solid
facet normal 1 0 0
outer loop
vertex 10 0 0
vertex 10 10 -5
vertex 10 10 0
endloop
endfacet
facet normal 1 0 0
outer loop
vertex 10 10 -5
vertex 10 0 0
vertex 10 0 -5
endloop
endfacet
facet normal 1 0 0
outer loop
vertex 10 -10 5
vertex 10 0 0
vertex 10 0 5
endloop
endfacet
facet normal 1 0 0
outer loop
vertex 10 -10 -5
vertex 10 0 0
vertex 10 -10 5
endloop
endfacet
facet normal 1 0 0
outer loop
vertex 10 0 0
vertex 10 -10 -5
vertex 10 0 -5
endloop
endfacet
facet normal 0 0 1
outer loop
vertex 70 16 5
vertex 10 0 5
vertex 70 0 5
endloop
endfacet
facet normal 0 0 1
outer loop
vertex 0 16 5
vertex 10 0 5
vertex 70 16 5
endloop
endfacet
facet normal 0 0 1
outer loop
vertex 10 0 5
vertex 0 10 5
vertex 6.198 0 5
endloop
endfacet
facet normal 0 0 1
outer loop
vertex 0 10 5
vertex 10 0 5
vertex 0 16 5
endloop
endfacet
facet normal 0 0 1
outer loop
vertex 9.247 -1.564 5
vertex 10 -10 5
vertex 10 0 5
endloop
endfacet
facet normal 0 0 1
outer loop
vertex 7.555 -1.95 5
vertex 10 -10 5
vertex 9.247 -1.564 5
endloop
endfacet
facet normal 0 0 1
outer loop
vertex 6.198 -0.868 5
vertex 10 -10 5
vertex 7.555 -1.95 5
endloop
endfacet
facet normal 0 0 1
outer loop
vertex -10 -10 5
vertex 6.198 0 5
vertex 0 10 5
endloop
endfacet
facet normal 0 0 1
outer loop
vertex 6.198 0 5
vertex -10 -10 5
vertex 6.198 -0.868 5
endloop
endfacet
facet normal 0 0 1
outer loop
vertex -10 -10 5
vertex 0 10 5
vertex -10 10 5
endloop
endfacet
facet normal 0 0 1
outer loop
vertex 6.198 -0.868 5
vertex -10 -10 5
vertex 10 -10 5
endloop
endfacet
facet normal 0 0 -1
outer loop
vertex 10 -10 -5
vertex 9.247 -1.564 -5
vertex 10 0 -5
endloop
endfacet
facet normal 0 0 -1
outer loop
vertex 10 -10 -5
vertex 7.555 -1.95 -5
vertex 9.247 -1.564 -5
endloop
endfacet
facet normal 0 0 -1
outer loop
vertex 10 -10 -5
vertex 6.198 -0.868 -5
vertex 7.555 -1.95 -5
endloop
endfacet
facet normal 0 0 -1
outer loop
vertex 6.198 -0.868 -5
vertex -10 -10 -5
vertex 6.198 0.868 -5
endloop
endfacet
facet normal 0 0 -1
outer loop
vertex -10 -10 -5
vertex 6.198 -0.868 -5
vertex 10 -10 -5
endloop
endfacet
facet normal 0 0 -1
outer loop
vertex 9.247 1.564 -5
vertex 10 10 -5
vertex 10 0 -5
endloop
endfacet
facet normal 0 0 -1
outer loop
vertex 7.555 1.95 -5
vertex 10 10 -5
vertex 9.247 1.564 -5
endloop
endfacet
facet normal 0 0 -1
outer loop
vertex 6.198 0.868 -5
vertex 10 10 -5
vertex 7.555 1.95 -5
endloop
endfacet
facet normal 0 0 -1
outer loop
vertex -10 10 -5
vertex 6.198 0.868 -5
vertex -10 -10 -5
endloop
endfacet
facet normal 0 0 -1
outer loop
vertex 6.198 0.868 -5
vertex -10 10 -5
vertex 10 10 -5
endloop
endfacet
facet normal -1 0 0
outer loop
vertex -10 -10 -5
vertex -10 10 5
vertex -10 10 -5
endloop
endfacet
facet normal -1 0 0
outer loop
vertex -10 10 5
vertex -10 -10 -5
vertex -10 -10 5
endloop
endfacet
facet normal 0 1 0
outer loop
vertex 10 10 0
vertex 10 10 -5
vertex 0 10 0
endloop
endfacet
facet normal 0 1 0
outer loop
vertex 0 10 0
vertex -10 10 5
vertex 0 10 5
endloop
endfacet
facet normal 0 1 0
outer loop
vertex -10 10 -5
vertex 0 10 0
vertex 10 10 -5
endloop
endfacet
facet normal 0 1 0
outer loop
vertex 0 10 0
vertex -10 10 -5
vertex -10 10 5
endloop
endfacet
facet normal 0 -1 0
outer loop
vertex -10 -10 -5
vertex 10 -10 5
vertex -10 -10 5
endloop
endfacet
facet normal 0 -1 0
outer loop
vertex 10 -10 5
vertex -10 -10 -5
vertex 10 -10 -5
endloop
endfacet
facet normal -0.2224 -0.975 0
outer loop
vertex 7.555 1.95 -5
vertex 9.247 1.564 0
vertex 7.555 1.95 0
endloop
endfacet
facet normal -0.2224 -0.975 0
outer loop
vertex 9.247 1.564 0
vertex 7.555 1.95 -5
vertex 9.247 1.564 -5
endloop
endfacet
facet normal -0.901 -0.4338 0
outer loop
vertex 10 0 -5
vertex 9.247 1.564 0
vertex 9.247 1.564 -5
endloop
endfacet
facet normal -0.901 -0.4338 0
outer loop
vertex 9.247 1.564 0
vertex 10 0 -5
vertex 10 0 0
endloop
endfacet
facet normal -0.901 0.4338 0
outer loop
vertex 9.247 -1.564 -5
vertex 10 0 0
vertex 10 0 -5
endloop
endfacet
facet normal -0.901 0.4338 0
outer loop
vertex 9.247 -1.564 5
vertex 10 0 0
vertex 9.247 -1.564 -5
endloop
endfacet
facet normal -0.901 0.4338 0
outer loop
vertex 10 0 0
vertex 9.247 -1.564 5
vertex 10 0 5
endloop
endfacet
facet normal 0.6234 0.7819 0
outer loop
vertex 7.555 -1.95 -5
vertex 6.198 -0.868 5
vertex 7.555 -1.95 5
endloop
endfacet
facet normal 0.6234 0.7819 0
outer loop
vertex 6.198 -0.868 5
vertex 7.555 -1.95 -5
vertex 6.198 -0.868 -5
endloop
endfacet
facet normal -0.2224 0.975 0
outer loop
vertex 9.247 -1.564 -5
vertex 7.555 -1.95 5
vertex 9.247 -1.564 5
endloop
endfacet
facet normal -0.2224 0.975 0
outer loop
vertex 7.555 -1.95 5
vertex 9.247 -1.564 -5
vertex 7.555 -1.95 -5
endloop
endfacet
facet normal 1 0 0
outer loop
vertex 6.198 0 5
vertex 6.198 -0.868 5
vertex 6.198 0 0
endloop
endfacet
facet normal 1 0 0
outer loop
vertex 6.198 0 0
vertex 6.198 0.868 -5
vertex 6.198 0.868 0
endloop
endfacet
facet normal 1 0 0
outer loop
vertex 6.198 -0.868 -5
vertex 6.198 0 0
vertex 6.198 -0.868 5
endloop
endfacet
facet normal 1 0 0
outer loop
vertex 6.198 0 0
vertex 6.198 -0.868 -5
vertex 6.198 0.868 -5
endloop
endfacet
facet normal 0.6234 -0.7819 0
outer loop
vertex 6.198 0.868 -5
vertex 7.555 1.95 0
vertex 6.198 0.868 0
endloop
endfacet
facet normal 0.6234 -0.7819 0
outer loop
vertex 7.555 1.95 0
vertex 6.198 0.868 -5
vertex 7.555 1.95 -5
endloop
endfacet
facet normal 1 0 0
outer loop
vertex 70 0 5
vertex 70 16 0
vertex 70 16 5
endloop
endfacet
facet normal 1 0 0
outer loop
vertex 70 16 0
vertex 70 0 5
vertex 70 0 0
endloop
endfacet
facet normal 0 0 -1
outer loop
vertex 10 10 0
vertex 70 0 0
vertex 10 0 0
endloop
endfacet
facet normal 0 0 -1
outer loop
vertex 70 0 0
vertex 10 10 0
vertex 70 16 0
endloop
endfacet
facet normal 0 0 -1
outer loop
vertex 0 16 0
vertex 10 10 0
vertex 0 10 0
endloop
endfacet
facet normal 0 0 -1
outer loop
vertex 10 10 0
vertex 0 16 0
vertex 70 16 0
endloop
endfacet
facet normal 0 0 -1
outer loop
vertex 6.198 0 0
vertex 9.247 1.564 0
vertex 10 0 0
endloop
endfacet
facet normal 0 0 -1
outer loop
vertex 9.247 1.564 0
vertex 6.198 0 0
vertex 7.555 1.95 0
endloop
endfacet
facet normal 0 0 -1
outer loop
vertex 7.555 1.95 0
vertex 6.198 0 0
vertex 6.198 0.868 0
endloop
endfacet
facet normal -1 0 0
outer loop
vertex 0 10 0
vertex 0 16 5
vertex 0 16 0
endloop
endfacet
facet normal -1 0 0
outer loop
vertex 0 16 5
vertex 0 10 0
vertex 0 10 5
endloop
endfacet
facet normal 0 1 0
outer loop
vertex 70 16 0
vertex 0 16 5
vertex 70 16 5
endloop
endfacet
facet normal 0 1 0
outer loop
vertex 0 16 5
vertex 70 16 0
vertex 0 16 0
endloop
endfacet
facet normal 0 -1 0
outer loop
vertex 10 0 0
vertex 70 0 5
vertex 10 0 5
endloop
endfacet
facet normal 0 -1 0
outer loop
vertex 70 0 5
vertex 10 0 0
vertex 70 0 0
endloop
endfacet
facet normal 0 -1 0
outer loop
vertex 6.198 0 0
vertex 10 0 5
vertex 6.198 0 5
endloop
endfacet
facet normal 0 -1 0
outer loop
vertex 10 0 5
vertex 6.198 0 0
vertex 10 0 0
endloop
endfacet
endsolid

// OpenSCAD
// Placeholder project_0.scad for Unit 0 foundations
// Replace with actual lesson model when available.

// Simple cube with a hole
difference(){
  cube([20,20,10], center=true);
  translate([8,0,0]) cylinder(h=12, r=2, center=true);
}
//Author: Chris Correll
//Date: 8/21/2022
//Description: Project 0 tactile floor marker v0 fits a velcro command strip

cube([70, 16, 5]);
